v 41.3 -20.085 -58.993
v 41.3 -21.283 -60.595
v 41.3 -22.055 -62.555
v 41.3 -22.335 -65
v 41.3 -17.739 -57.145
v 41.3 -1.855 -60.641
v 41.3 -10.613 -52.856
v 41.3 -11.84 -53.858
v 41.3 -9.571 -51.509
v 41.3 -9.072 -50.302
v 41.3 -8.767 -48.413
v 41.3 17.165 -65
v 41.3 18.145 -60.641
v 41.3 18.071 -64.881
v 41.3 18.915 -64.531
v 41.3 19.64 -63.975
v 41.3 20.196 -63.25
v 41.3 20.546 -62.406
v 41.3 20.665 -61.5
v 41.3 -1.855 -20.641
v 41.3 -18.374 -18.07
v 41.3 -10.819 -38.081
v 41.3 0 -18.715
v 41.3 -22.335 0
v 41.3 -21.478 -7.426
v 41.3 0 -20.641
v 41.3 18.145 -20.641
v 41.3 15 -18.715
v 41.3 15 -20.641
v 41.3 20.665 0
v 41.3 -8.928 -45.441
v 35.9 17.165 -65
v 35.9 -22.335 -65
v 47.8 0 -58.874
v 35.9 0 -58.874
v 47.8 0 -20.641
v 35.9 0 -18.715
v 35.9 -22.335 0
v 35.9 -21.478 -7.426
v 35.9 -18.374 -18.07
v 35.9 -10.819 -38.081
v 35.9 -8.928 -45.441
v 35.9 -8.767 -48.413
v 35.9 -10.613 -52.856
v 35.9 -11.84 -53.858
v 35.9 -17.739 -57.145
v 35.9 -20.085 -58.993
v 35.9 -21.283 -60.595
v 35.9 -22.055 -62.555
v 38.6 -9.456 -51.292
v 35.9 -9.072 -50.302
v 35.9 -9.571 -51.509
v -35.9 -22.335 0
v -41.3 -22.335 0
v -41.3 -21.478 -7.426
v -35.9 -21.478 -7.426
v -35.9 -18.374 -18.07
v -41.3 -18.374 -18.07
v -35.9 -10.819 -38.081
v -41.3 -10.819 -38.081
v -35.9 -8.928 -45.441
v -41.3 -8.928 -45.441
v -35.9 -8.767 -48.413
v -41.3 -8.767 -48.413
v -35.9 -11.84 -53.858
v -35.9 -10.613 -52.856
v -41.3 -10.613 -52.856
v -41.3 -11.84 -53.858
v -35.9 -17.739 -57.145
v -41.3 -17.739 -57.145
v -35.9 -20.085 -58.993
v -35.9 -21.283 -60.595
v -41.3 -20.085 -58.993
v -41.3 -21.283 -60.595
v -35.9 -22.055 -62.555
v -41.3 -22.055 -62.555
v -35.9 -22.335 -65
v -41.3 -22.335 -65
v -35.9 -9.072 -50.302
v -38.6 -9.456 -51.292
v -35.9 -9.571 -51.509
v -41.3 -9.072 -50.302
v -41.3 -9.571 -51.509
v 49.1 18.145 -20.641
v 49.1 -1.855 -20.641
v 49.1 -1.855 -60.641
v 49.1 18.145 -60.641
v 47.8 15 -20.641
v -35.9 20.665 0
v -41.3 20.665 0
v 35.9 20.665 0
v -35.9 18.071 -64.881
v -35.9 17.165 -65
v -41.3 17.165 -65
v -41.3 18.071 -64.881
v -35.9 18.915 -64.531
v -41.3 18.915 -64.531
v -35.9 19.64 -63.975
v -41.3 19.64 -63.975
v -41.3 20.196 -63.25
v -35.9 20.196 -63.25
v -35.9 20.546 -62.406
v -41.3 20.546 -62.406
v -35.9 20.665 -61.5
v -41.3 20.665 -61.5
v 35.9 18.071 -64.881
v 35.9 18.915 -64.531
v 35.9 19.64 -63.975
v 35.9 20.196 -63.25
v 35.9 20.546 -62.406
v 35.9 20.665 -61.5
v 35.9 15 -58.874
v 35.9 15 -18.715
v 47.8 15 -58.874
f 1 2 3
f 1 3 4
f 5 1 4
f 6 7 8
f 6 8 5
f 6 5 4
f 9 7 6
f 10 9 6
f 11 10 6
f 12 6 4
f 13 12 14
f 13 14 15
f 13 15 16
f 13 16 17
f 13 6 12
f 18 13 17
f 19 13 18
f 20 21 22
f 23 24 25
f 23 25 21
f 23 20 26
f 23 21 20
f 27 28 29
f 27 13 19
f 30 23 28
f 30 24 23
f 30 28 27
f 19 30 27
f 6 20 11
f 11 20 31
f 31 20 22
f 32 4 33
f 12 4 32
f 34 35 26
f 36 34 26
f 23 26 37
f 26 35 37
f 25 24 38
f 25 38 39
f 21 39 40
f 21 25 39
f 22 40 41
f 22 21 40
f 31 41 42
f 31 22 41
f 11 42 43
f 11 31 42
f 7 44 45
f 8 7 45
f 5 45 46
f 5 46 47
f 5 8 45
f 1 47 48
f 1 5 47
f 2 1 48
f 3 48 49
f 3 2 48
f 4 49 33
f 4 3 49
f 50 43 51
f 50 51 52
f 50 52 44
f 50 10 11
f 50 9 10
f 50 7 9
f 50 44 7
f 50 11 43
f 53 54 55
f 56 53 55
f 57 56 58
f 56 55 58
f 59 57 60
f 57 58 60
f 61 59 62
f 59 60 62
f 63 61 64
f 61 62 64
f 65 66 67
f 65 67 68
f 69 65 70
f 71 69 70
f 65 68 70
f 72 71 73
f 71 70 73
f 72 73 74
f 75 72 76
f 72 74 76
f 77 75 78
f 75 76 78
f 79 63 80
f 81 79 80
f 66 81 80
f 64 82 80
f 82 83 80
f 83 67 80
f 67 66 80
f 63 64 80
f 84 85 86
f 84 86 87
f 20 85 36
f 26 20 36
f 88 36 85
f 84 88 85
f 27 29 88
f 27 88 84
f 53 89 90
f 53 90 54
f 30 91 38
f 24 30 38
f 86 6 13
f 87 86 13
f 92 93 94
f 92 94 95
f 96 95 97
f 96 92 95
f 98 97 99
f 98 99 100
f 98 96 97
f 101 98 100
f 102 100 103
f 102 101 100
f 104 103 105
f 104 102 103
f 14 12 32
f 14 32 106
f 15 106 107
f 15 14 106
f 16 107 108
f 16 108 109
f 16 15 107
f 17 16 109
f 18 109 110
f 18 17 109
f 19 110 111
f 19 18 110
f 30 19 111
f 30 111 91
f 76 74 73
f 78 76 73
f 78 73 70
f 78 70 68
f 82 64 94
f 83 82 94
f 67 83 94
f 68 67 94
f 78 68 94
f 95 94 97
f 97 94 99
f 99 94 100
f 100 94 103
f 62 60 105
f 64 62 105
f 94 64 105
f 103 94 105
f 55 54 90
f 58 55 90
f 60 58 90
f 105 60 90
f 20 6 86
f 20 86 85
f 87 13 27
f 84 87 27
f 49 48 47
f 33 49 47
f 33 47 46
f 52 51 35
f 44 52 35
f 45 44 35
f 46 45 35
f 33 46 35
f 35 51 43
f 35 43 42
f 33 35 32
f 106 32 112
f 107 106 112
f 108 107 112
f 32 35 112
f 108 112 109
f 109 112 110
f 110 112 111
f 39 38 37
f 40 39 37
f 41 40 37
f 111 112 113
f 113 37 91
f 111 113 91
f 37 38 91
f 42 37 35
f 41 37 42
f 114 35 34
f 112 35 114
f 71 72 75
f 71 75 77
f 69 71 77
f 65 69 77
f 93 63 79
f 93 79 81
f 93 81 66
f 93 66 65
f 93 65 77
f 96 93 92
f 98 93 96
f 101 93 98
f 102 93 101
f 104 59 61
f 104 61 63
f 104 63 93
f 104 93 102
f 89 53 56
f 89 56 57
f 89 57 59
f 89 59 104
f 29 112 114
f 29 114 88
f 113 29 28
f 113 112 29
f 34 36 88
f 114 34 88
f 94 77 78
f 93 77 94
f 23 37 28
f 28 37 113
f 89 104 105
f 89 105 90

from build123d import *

# Parameters (mm, degrees)
F0_R      = 1.75
F1_DEPTH  = 3
F3_DEPTH  = 41.3
F5_DEPTH  = 5.4
F6_W      = 20
F6_H      = 40
F7_DEPTH  = 49.1
F8_DEPTH  = 25
F9_W      = 15
F9_H      = 40.159
F10_DEPTH = 47.8


# Not quite as in the source:
# - a feature names something its author has since deleted; it is built from what else it names


with BuildPart() as f1:
    # F0 (on Top) → F1 (new body)
    with BuildSketch(Plane.XY):
        with BuildLine():
            Line((-41.5, -22.5), (41.5, -22.5))
            ThreePointArc((41.5, -22.5), (43.9748737342, -21.4748737342), (45, -19))
            Line((45, -19), (45, 19))
            ThreePointArc((45, 19), (43.9748737342, 21.4748737342), (41.5, 22.5))
            Line((41.5, 22.5), (-41.5, 22.5))
            ThreePointArc((-41.5, 22.5), (-43.9748737342, 21.4748737342), (-45, 19))
            Line((-45, 19), (-45, -19))
            ThreePointArc((-45, -19), (-43.9748737342, -21.4748737342), (-41.5, -22.5))
        make_face()
        with Locations((-30, -7.5)):
            Circle(F0_R, mode=Mode.SUBTRACT)
        with Locations((-15, -7.5)):
            Circle(F0_R, mode=Mode.SUBTRACT)
        with Locations((0, -7.5)):
            Circle(F0_R, mode=Mode.SUBTRACT)
        with Locations((15, -7.5)):
            Circle(F0_R, mode=Mode.SUBTRACT)
        with Locations((30, -7.5)):
            Circle(F0_R, mode=Mode.SUBTRACT)
        with Locations((-30, 7.5)):
            Circle(F0_R, mode=Mode.SUBTRACT)
        with Locations((-15, 7.5)):
            Circle(F0_R, mode=Mode.SUBTRACT)
        with Locations((0, 7.5)):
            Circle(F0_R, mode=Mode.SUBTRACT)
        with Locations((15.1128452271, 7.5)):
            Circle(F0_R, mode=Mode.SUBTRACT)
        with Locations((30, 7.5)):
            Circle(F0_R, mode=Mode.SUBTRACT)
    extrude(amount=F1_DEPTH)

    # F2 (on Right) → F3 (join, symmetric)
    with BuildSketch(Plane.YZ):
        with BuildLine():
            Line((20.66504623, -61.5), (20.66504623, 0))
            Line((20.66504623, 0), (-22.33495377, 0))
            add(Edge.make_bspline(
                [(-22.33495377, 0), (-22.33495377, -17.2751359642), (5.181919243, -57.6798408053), (-22.33495377, -55.771779269), (-22.33495377, -65)],
                knots=[0, 0, 0, 0, 0.6264206586, 1, 1, 1, 1], degree=3))
            Line((-22.33495377, -65), (17.16504623, -65))
            ThreePointArc((17.16504623, -65), (19.6399199641, -63.9748737342), (20.66504623, -61.5))
        make_face()
    extrude(amount=F3_DEPTH, both=True)

    # F5 (intersect, symmetric): faces of the model
    f5_faces = [f1.faces().sort_by_distance(p)[0] for p in [
        (-41.3, 2.0507565741, -31.3637201266),
        (41.3, 2.0507565741, -31.3637201266),
    ]]
    extrude(f5_faces, amount=F5_DEPTH, both=True, dir=(-1, 0, 0), mode=Mode.INTERSECT)

    # F6 (on Right) → F7 (join)
    with BuildSketch(Plane.YZ):
        with Locations((8.1445764424, -40.6413669884)):
            Rectangle(F6_W, F6_H)
    extrude(amount=F7_DEPTH)

    # F8 (cut): a face of the model
    f8_faces = [f1.faces().sort_by_distance(p)[0] for p in [
        (17.95, 18.1445764424, -40.6413669884),
    ]]
    extrude(f8_faces, amount=-F8_DEPTH, mode=Mode.SUBTRACT)

    # F9 (on Right) → F10 (cut)
    with BuildSketch(Plane.YZ):
        with Locations((7.5, -38.7948798435)):
            Rectangle(F9_W, F9_H)
    extrude(amount=F10_DEPTH, mode=Mode.SUBTRACT)


solid = f1.part
